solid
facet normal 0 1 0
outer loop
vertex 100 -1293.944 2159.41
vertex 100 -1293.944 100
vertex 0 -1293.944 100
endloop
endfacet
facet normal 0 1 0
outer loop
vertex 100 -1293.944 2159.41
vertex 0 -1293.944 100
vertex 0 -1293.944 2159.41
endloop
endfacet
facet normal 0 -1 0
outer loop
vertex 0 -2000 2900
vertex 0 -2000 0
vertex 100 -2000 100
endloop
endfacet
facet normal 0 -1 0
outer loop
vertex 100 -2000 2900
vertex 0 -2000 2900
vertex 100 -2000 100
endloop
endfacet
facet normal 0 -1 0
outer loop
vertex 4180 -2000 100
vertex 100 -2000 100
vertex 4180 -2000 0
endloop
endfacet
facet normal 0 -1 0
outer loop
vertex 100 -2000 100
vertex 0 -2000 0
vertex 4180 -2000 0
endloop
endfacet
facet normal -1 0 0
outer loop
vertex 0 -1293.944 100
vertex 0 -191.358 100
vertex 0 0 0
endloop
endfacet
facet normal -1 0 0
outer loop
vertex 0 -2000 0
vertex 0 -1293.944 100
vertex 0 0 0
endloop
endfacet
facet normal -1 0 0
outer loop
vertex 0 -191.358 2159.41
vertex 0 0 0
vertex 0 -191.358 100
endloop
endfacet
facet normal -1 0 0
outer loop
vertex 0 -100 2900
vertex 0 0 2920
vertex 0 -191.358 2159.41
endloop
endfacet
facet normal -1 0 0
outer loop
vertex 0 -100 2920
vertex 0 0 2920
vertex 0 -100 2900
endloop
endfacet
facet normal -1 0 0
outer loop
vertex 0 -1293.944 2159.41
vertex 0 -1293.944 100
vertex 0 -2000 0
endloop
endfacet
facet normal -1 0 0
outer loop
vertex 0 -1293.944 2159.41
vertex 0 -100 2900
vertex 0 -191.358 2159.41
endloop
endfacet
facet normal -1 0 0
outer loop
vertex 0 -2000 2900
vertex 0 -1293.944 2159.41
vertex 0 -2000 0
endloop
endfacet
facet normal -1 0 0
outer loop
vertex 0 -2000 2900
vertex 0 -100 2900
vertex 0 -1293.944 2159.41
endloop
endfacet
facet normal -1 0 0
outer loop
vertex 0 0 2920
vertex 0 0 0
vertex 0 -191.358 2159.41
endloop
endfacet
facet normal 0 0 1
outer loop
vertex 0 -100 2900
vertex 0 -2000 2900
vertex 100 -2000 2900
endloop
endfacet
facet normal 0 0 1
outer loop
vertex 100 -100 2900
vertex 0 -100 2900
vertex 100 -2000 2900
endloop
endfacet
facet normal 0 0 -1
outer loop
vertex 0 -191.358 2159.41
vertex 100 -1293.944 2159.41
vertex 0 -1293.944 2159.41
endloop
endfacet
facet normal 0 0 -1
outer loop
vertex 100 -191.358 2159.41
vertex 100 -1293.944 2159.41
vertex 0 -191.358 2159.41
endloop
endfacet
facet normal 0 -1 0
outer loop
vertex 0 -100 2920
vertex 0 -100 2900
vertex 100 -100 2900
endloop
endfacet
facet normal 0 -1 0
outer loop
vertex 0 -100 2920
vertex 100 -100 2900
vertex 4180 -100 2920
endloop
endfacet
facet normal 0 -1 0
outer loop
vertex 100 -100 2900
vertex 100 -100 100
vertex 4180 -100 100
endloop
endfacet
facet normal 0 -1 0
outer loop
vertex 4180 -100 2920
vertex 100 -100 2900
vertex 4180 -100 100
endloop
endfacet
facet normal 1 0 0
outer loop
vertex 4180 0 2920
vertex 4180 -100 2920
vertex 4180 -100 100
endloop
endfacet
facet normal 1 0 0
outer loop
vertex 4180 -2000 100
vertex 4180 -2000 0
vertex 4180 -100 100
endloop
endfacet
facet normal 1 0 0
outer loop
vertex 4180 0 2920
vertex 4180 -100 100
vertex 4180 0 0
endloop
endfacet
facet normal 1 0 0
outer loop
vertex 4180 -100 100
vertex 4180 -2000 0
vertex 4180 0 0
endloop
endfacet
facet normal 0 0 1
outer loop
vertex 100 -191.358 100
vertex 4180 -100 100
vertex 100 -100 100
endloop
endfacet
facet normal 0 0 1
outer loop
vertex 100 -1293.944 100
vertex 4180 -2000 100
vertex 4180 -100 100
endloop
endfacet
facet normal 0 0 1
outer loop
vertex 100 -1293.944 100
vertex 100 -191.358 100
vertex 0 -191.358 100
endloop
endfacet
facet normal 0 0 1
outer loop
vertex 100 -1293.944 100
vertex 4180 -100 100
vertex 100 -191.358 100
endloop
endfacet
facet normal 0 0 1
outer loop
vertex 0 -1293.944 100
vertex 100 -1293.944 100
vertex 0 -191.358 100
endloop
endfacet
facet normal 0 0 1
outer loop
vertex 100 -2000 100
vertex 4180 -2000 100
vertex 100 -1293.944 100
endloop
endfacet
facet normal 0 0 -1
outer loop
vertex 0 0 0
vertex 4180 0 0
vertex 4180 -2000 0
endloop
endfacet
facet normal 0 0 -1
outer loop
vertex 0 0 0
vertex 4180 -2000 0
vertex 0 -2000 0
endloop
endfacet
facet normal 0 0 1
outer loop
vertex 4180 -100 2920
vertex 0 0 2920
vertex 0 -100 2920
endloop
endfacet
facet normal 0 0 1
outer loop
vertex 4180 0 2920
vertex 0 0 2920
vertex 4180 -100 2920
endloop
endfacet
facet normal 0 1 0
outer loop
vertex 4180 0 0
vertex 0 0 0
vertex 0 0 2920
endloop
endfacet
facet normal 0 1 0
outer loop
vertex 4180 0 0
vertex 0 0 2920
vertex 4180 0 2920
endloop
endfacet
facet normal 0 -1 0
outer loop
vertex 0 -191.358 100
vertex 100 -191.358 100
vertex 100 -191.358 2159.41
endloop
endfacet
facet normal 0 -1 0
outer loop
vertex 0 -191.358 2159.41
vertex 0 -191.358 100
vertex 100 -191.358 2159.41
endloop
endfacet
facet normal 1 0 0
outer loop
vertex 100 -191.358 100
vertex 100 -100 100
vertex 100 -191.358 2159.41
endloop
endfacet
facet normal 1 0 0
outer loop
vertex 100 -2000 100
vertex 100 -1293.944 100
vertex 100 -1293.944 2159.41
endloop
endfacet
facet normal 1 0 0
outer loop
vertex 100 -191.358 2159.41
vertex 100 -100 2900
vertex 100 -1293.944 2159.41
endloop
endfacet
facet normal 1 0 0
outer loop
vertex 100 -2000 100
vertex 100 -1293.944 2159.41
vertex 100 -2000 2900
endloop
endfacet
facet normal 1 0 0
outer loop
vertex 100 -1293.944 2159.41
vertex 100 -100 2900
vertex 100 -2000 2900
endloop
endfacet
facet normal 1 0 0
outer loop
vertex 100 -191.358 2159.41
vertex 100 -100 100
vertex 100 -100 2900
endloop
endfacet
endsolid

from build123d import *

# Parameters (mm, degrees)
F0_W      = 49.6836304665
F0_H      = 40.4926985502
F1_DEPTH  = 100
F2_DEPTH  = 4280
F3_DEPTH  = 2000
F4_W      = 4280
F4_H      = 100
F6_DEPTH  = 2820
F5_W      = 100
F5_H      = 1900
F7_DEPTH  = 2800
F8_W      = 1132.6048374176
F8_H      = 2209.3509674072
F9_DEPTH  = 100
F10_DEPTH = 57.9633247107
F11_DEPTH = 87.9824329168
F12_DEPTH = 149.9407831579
F13_DEPTH = 100


with BuildPart() as f1:
    # F0 (on Top) → F1 (new body)
    with BuildSketch(Plane.XY):
        with Locations((24.8418152332, -20.2463492751)):
            Rectangle(F0_W, F0_H)
    extrude(amount=F1_DEPTH)

    # F2 (add): a face of the model
    f2_faces = [f1.faces().sort_by_distance(p)[0] for p in [
        (0, -20.2463492751, 50),
    ]]
    extrude(f2_faces, amount=-F2_DEPTH)

    # F3 (add): a face of the model
    f3_faces = [f1.faces().sort_by_distance(p)[0] for p in [
        (2140, 0, 50),
    ]]
    extrude(f3_faces, amount=-F3_DEPTH)

    # F4 (on face) → F6 (join)
    with BuildSketch(Plane.XY.offset(100)):
        with Locations((2140, -50)):
            Rectangle(F4_W, F4_H)
    extrude(amount=F6_DEPTH)

    # F5 (on face) → F7 (join)
    with BuildSketch(Plane.XY.offset(100)):
        with Locations((50, -1050)):
            Rectangle(F5_W, F5_H)
    extrude(amount=F7_DEPTH)

    # F8 (on face) → F9 (cut)
    with BuildSketch(Plane.YZ.offset(100)):
        with Locations((-815.6238794327, 1204.6754837036)):
            Rectangle(F8_W, F8_H)
    extrude(amount=-F9_DEPTH, mode=Mode.SUBTRACT)

    # F10 (cut): a face of the model
    f10_faces = [f1.faces().sort_by_distance(p)[0] for p in [
        (50, -249.3214607239, 1204.6754837036),
    ]]
    extrude(f10_faces, amount=-F10_DEPTH, mode=Mode.SUBTRACT)

    # F11 (add): a face of the model
    f11_faces = [f1.faces().sort_by_distance(p)[0] for p in [
        (50, -1381.9262981415, 1204.6754837036),
    ]]
    extrude(f11_faces, amount=F11_DEPTH)

    # F12 (add): a face of the model
    f12_faces = [f1.faces().sort_by_distance(p)[0] for p in [
        (50, -742.6510006189, 2309.3509674072),
    ]]
    extrude(f12_faces, amount=F12_DEPTH)

    # F13 (cut): a face of the model
    f13_faces = [f1.faces().sort_by_distance(p)[0] for p in [
        (4280, -35.3926546052, 1460),
    ]]
    extrude(f13_faces, amount=-F13_DEPTH, mode=Mode.SUBTRACT)


solid = f1.part
